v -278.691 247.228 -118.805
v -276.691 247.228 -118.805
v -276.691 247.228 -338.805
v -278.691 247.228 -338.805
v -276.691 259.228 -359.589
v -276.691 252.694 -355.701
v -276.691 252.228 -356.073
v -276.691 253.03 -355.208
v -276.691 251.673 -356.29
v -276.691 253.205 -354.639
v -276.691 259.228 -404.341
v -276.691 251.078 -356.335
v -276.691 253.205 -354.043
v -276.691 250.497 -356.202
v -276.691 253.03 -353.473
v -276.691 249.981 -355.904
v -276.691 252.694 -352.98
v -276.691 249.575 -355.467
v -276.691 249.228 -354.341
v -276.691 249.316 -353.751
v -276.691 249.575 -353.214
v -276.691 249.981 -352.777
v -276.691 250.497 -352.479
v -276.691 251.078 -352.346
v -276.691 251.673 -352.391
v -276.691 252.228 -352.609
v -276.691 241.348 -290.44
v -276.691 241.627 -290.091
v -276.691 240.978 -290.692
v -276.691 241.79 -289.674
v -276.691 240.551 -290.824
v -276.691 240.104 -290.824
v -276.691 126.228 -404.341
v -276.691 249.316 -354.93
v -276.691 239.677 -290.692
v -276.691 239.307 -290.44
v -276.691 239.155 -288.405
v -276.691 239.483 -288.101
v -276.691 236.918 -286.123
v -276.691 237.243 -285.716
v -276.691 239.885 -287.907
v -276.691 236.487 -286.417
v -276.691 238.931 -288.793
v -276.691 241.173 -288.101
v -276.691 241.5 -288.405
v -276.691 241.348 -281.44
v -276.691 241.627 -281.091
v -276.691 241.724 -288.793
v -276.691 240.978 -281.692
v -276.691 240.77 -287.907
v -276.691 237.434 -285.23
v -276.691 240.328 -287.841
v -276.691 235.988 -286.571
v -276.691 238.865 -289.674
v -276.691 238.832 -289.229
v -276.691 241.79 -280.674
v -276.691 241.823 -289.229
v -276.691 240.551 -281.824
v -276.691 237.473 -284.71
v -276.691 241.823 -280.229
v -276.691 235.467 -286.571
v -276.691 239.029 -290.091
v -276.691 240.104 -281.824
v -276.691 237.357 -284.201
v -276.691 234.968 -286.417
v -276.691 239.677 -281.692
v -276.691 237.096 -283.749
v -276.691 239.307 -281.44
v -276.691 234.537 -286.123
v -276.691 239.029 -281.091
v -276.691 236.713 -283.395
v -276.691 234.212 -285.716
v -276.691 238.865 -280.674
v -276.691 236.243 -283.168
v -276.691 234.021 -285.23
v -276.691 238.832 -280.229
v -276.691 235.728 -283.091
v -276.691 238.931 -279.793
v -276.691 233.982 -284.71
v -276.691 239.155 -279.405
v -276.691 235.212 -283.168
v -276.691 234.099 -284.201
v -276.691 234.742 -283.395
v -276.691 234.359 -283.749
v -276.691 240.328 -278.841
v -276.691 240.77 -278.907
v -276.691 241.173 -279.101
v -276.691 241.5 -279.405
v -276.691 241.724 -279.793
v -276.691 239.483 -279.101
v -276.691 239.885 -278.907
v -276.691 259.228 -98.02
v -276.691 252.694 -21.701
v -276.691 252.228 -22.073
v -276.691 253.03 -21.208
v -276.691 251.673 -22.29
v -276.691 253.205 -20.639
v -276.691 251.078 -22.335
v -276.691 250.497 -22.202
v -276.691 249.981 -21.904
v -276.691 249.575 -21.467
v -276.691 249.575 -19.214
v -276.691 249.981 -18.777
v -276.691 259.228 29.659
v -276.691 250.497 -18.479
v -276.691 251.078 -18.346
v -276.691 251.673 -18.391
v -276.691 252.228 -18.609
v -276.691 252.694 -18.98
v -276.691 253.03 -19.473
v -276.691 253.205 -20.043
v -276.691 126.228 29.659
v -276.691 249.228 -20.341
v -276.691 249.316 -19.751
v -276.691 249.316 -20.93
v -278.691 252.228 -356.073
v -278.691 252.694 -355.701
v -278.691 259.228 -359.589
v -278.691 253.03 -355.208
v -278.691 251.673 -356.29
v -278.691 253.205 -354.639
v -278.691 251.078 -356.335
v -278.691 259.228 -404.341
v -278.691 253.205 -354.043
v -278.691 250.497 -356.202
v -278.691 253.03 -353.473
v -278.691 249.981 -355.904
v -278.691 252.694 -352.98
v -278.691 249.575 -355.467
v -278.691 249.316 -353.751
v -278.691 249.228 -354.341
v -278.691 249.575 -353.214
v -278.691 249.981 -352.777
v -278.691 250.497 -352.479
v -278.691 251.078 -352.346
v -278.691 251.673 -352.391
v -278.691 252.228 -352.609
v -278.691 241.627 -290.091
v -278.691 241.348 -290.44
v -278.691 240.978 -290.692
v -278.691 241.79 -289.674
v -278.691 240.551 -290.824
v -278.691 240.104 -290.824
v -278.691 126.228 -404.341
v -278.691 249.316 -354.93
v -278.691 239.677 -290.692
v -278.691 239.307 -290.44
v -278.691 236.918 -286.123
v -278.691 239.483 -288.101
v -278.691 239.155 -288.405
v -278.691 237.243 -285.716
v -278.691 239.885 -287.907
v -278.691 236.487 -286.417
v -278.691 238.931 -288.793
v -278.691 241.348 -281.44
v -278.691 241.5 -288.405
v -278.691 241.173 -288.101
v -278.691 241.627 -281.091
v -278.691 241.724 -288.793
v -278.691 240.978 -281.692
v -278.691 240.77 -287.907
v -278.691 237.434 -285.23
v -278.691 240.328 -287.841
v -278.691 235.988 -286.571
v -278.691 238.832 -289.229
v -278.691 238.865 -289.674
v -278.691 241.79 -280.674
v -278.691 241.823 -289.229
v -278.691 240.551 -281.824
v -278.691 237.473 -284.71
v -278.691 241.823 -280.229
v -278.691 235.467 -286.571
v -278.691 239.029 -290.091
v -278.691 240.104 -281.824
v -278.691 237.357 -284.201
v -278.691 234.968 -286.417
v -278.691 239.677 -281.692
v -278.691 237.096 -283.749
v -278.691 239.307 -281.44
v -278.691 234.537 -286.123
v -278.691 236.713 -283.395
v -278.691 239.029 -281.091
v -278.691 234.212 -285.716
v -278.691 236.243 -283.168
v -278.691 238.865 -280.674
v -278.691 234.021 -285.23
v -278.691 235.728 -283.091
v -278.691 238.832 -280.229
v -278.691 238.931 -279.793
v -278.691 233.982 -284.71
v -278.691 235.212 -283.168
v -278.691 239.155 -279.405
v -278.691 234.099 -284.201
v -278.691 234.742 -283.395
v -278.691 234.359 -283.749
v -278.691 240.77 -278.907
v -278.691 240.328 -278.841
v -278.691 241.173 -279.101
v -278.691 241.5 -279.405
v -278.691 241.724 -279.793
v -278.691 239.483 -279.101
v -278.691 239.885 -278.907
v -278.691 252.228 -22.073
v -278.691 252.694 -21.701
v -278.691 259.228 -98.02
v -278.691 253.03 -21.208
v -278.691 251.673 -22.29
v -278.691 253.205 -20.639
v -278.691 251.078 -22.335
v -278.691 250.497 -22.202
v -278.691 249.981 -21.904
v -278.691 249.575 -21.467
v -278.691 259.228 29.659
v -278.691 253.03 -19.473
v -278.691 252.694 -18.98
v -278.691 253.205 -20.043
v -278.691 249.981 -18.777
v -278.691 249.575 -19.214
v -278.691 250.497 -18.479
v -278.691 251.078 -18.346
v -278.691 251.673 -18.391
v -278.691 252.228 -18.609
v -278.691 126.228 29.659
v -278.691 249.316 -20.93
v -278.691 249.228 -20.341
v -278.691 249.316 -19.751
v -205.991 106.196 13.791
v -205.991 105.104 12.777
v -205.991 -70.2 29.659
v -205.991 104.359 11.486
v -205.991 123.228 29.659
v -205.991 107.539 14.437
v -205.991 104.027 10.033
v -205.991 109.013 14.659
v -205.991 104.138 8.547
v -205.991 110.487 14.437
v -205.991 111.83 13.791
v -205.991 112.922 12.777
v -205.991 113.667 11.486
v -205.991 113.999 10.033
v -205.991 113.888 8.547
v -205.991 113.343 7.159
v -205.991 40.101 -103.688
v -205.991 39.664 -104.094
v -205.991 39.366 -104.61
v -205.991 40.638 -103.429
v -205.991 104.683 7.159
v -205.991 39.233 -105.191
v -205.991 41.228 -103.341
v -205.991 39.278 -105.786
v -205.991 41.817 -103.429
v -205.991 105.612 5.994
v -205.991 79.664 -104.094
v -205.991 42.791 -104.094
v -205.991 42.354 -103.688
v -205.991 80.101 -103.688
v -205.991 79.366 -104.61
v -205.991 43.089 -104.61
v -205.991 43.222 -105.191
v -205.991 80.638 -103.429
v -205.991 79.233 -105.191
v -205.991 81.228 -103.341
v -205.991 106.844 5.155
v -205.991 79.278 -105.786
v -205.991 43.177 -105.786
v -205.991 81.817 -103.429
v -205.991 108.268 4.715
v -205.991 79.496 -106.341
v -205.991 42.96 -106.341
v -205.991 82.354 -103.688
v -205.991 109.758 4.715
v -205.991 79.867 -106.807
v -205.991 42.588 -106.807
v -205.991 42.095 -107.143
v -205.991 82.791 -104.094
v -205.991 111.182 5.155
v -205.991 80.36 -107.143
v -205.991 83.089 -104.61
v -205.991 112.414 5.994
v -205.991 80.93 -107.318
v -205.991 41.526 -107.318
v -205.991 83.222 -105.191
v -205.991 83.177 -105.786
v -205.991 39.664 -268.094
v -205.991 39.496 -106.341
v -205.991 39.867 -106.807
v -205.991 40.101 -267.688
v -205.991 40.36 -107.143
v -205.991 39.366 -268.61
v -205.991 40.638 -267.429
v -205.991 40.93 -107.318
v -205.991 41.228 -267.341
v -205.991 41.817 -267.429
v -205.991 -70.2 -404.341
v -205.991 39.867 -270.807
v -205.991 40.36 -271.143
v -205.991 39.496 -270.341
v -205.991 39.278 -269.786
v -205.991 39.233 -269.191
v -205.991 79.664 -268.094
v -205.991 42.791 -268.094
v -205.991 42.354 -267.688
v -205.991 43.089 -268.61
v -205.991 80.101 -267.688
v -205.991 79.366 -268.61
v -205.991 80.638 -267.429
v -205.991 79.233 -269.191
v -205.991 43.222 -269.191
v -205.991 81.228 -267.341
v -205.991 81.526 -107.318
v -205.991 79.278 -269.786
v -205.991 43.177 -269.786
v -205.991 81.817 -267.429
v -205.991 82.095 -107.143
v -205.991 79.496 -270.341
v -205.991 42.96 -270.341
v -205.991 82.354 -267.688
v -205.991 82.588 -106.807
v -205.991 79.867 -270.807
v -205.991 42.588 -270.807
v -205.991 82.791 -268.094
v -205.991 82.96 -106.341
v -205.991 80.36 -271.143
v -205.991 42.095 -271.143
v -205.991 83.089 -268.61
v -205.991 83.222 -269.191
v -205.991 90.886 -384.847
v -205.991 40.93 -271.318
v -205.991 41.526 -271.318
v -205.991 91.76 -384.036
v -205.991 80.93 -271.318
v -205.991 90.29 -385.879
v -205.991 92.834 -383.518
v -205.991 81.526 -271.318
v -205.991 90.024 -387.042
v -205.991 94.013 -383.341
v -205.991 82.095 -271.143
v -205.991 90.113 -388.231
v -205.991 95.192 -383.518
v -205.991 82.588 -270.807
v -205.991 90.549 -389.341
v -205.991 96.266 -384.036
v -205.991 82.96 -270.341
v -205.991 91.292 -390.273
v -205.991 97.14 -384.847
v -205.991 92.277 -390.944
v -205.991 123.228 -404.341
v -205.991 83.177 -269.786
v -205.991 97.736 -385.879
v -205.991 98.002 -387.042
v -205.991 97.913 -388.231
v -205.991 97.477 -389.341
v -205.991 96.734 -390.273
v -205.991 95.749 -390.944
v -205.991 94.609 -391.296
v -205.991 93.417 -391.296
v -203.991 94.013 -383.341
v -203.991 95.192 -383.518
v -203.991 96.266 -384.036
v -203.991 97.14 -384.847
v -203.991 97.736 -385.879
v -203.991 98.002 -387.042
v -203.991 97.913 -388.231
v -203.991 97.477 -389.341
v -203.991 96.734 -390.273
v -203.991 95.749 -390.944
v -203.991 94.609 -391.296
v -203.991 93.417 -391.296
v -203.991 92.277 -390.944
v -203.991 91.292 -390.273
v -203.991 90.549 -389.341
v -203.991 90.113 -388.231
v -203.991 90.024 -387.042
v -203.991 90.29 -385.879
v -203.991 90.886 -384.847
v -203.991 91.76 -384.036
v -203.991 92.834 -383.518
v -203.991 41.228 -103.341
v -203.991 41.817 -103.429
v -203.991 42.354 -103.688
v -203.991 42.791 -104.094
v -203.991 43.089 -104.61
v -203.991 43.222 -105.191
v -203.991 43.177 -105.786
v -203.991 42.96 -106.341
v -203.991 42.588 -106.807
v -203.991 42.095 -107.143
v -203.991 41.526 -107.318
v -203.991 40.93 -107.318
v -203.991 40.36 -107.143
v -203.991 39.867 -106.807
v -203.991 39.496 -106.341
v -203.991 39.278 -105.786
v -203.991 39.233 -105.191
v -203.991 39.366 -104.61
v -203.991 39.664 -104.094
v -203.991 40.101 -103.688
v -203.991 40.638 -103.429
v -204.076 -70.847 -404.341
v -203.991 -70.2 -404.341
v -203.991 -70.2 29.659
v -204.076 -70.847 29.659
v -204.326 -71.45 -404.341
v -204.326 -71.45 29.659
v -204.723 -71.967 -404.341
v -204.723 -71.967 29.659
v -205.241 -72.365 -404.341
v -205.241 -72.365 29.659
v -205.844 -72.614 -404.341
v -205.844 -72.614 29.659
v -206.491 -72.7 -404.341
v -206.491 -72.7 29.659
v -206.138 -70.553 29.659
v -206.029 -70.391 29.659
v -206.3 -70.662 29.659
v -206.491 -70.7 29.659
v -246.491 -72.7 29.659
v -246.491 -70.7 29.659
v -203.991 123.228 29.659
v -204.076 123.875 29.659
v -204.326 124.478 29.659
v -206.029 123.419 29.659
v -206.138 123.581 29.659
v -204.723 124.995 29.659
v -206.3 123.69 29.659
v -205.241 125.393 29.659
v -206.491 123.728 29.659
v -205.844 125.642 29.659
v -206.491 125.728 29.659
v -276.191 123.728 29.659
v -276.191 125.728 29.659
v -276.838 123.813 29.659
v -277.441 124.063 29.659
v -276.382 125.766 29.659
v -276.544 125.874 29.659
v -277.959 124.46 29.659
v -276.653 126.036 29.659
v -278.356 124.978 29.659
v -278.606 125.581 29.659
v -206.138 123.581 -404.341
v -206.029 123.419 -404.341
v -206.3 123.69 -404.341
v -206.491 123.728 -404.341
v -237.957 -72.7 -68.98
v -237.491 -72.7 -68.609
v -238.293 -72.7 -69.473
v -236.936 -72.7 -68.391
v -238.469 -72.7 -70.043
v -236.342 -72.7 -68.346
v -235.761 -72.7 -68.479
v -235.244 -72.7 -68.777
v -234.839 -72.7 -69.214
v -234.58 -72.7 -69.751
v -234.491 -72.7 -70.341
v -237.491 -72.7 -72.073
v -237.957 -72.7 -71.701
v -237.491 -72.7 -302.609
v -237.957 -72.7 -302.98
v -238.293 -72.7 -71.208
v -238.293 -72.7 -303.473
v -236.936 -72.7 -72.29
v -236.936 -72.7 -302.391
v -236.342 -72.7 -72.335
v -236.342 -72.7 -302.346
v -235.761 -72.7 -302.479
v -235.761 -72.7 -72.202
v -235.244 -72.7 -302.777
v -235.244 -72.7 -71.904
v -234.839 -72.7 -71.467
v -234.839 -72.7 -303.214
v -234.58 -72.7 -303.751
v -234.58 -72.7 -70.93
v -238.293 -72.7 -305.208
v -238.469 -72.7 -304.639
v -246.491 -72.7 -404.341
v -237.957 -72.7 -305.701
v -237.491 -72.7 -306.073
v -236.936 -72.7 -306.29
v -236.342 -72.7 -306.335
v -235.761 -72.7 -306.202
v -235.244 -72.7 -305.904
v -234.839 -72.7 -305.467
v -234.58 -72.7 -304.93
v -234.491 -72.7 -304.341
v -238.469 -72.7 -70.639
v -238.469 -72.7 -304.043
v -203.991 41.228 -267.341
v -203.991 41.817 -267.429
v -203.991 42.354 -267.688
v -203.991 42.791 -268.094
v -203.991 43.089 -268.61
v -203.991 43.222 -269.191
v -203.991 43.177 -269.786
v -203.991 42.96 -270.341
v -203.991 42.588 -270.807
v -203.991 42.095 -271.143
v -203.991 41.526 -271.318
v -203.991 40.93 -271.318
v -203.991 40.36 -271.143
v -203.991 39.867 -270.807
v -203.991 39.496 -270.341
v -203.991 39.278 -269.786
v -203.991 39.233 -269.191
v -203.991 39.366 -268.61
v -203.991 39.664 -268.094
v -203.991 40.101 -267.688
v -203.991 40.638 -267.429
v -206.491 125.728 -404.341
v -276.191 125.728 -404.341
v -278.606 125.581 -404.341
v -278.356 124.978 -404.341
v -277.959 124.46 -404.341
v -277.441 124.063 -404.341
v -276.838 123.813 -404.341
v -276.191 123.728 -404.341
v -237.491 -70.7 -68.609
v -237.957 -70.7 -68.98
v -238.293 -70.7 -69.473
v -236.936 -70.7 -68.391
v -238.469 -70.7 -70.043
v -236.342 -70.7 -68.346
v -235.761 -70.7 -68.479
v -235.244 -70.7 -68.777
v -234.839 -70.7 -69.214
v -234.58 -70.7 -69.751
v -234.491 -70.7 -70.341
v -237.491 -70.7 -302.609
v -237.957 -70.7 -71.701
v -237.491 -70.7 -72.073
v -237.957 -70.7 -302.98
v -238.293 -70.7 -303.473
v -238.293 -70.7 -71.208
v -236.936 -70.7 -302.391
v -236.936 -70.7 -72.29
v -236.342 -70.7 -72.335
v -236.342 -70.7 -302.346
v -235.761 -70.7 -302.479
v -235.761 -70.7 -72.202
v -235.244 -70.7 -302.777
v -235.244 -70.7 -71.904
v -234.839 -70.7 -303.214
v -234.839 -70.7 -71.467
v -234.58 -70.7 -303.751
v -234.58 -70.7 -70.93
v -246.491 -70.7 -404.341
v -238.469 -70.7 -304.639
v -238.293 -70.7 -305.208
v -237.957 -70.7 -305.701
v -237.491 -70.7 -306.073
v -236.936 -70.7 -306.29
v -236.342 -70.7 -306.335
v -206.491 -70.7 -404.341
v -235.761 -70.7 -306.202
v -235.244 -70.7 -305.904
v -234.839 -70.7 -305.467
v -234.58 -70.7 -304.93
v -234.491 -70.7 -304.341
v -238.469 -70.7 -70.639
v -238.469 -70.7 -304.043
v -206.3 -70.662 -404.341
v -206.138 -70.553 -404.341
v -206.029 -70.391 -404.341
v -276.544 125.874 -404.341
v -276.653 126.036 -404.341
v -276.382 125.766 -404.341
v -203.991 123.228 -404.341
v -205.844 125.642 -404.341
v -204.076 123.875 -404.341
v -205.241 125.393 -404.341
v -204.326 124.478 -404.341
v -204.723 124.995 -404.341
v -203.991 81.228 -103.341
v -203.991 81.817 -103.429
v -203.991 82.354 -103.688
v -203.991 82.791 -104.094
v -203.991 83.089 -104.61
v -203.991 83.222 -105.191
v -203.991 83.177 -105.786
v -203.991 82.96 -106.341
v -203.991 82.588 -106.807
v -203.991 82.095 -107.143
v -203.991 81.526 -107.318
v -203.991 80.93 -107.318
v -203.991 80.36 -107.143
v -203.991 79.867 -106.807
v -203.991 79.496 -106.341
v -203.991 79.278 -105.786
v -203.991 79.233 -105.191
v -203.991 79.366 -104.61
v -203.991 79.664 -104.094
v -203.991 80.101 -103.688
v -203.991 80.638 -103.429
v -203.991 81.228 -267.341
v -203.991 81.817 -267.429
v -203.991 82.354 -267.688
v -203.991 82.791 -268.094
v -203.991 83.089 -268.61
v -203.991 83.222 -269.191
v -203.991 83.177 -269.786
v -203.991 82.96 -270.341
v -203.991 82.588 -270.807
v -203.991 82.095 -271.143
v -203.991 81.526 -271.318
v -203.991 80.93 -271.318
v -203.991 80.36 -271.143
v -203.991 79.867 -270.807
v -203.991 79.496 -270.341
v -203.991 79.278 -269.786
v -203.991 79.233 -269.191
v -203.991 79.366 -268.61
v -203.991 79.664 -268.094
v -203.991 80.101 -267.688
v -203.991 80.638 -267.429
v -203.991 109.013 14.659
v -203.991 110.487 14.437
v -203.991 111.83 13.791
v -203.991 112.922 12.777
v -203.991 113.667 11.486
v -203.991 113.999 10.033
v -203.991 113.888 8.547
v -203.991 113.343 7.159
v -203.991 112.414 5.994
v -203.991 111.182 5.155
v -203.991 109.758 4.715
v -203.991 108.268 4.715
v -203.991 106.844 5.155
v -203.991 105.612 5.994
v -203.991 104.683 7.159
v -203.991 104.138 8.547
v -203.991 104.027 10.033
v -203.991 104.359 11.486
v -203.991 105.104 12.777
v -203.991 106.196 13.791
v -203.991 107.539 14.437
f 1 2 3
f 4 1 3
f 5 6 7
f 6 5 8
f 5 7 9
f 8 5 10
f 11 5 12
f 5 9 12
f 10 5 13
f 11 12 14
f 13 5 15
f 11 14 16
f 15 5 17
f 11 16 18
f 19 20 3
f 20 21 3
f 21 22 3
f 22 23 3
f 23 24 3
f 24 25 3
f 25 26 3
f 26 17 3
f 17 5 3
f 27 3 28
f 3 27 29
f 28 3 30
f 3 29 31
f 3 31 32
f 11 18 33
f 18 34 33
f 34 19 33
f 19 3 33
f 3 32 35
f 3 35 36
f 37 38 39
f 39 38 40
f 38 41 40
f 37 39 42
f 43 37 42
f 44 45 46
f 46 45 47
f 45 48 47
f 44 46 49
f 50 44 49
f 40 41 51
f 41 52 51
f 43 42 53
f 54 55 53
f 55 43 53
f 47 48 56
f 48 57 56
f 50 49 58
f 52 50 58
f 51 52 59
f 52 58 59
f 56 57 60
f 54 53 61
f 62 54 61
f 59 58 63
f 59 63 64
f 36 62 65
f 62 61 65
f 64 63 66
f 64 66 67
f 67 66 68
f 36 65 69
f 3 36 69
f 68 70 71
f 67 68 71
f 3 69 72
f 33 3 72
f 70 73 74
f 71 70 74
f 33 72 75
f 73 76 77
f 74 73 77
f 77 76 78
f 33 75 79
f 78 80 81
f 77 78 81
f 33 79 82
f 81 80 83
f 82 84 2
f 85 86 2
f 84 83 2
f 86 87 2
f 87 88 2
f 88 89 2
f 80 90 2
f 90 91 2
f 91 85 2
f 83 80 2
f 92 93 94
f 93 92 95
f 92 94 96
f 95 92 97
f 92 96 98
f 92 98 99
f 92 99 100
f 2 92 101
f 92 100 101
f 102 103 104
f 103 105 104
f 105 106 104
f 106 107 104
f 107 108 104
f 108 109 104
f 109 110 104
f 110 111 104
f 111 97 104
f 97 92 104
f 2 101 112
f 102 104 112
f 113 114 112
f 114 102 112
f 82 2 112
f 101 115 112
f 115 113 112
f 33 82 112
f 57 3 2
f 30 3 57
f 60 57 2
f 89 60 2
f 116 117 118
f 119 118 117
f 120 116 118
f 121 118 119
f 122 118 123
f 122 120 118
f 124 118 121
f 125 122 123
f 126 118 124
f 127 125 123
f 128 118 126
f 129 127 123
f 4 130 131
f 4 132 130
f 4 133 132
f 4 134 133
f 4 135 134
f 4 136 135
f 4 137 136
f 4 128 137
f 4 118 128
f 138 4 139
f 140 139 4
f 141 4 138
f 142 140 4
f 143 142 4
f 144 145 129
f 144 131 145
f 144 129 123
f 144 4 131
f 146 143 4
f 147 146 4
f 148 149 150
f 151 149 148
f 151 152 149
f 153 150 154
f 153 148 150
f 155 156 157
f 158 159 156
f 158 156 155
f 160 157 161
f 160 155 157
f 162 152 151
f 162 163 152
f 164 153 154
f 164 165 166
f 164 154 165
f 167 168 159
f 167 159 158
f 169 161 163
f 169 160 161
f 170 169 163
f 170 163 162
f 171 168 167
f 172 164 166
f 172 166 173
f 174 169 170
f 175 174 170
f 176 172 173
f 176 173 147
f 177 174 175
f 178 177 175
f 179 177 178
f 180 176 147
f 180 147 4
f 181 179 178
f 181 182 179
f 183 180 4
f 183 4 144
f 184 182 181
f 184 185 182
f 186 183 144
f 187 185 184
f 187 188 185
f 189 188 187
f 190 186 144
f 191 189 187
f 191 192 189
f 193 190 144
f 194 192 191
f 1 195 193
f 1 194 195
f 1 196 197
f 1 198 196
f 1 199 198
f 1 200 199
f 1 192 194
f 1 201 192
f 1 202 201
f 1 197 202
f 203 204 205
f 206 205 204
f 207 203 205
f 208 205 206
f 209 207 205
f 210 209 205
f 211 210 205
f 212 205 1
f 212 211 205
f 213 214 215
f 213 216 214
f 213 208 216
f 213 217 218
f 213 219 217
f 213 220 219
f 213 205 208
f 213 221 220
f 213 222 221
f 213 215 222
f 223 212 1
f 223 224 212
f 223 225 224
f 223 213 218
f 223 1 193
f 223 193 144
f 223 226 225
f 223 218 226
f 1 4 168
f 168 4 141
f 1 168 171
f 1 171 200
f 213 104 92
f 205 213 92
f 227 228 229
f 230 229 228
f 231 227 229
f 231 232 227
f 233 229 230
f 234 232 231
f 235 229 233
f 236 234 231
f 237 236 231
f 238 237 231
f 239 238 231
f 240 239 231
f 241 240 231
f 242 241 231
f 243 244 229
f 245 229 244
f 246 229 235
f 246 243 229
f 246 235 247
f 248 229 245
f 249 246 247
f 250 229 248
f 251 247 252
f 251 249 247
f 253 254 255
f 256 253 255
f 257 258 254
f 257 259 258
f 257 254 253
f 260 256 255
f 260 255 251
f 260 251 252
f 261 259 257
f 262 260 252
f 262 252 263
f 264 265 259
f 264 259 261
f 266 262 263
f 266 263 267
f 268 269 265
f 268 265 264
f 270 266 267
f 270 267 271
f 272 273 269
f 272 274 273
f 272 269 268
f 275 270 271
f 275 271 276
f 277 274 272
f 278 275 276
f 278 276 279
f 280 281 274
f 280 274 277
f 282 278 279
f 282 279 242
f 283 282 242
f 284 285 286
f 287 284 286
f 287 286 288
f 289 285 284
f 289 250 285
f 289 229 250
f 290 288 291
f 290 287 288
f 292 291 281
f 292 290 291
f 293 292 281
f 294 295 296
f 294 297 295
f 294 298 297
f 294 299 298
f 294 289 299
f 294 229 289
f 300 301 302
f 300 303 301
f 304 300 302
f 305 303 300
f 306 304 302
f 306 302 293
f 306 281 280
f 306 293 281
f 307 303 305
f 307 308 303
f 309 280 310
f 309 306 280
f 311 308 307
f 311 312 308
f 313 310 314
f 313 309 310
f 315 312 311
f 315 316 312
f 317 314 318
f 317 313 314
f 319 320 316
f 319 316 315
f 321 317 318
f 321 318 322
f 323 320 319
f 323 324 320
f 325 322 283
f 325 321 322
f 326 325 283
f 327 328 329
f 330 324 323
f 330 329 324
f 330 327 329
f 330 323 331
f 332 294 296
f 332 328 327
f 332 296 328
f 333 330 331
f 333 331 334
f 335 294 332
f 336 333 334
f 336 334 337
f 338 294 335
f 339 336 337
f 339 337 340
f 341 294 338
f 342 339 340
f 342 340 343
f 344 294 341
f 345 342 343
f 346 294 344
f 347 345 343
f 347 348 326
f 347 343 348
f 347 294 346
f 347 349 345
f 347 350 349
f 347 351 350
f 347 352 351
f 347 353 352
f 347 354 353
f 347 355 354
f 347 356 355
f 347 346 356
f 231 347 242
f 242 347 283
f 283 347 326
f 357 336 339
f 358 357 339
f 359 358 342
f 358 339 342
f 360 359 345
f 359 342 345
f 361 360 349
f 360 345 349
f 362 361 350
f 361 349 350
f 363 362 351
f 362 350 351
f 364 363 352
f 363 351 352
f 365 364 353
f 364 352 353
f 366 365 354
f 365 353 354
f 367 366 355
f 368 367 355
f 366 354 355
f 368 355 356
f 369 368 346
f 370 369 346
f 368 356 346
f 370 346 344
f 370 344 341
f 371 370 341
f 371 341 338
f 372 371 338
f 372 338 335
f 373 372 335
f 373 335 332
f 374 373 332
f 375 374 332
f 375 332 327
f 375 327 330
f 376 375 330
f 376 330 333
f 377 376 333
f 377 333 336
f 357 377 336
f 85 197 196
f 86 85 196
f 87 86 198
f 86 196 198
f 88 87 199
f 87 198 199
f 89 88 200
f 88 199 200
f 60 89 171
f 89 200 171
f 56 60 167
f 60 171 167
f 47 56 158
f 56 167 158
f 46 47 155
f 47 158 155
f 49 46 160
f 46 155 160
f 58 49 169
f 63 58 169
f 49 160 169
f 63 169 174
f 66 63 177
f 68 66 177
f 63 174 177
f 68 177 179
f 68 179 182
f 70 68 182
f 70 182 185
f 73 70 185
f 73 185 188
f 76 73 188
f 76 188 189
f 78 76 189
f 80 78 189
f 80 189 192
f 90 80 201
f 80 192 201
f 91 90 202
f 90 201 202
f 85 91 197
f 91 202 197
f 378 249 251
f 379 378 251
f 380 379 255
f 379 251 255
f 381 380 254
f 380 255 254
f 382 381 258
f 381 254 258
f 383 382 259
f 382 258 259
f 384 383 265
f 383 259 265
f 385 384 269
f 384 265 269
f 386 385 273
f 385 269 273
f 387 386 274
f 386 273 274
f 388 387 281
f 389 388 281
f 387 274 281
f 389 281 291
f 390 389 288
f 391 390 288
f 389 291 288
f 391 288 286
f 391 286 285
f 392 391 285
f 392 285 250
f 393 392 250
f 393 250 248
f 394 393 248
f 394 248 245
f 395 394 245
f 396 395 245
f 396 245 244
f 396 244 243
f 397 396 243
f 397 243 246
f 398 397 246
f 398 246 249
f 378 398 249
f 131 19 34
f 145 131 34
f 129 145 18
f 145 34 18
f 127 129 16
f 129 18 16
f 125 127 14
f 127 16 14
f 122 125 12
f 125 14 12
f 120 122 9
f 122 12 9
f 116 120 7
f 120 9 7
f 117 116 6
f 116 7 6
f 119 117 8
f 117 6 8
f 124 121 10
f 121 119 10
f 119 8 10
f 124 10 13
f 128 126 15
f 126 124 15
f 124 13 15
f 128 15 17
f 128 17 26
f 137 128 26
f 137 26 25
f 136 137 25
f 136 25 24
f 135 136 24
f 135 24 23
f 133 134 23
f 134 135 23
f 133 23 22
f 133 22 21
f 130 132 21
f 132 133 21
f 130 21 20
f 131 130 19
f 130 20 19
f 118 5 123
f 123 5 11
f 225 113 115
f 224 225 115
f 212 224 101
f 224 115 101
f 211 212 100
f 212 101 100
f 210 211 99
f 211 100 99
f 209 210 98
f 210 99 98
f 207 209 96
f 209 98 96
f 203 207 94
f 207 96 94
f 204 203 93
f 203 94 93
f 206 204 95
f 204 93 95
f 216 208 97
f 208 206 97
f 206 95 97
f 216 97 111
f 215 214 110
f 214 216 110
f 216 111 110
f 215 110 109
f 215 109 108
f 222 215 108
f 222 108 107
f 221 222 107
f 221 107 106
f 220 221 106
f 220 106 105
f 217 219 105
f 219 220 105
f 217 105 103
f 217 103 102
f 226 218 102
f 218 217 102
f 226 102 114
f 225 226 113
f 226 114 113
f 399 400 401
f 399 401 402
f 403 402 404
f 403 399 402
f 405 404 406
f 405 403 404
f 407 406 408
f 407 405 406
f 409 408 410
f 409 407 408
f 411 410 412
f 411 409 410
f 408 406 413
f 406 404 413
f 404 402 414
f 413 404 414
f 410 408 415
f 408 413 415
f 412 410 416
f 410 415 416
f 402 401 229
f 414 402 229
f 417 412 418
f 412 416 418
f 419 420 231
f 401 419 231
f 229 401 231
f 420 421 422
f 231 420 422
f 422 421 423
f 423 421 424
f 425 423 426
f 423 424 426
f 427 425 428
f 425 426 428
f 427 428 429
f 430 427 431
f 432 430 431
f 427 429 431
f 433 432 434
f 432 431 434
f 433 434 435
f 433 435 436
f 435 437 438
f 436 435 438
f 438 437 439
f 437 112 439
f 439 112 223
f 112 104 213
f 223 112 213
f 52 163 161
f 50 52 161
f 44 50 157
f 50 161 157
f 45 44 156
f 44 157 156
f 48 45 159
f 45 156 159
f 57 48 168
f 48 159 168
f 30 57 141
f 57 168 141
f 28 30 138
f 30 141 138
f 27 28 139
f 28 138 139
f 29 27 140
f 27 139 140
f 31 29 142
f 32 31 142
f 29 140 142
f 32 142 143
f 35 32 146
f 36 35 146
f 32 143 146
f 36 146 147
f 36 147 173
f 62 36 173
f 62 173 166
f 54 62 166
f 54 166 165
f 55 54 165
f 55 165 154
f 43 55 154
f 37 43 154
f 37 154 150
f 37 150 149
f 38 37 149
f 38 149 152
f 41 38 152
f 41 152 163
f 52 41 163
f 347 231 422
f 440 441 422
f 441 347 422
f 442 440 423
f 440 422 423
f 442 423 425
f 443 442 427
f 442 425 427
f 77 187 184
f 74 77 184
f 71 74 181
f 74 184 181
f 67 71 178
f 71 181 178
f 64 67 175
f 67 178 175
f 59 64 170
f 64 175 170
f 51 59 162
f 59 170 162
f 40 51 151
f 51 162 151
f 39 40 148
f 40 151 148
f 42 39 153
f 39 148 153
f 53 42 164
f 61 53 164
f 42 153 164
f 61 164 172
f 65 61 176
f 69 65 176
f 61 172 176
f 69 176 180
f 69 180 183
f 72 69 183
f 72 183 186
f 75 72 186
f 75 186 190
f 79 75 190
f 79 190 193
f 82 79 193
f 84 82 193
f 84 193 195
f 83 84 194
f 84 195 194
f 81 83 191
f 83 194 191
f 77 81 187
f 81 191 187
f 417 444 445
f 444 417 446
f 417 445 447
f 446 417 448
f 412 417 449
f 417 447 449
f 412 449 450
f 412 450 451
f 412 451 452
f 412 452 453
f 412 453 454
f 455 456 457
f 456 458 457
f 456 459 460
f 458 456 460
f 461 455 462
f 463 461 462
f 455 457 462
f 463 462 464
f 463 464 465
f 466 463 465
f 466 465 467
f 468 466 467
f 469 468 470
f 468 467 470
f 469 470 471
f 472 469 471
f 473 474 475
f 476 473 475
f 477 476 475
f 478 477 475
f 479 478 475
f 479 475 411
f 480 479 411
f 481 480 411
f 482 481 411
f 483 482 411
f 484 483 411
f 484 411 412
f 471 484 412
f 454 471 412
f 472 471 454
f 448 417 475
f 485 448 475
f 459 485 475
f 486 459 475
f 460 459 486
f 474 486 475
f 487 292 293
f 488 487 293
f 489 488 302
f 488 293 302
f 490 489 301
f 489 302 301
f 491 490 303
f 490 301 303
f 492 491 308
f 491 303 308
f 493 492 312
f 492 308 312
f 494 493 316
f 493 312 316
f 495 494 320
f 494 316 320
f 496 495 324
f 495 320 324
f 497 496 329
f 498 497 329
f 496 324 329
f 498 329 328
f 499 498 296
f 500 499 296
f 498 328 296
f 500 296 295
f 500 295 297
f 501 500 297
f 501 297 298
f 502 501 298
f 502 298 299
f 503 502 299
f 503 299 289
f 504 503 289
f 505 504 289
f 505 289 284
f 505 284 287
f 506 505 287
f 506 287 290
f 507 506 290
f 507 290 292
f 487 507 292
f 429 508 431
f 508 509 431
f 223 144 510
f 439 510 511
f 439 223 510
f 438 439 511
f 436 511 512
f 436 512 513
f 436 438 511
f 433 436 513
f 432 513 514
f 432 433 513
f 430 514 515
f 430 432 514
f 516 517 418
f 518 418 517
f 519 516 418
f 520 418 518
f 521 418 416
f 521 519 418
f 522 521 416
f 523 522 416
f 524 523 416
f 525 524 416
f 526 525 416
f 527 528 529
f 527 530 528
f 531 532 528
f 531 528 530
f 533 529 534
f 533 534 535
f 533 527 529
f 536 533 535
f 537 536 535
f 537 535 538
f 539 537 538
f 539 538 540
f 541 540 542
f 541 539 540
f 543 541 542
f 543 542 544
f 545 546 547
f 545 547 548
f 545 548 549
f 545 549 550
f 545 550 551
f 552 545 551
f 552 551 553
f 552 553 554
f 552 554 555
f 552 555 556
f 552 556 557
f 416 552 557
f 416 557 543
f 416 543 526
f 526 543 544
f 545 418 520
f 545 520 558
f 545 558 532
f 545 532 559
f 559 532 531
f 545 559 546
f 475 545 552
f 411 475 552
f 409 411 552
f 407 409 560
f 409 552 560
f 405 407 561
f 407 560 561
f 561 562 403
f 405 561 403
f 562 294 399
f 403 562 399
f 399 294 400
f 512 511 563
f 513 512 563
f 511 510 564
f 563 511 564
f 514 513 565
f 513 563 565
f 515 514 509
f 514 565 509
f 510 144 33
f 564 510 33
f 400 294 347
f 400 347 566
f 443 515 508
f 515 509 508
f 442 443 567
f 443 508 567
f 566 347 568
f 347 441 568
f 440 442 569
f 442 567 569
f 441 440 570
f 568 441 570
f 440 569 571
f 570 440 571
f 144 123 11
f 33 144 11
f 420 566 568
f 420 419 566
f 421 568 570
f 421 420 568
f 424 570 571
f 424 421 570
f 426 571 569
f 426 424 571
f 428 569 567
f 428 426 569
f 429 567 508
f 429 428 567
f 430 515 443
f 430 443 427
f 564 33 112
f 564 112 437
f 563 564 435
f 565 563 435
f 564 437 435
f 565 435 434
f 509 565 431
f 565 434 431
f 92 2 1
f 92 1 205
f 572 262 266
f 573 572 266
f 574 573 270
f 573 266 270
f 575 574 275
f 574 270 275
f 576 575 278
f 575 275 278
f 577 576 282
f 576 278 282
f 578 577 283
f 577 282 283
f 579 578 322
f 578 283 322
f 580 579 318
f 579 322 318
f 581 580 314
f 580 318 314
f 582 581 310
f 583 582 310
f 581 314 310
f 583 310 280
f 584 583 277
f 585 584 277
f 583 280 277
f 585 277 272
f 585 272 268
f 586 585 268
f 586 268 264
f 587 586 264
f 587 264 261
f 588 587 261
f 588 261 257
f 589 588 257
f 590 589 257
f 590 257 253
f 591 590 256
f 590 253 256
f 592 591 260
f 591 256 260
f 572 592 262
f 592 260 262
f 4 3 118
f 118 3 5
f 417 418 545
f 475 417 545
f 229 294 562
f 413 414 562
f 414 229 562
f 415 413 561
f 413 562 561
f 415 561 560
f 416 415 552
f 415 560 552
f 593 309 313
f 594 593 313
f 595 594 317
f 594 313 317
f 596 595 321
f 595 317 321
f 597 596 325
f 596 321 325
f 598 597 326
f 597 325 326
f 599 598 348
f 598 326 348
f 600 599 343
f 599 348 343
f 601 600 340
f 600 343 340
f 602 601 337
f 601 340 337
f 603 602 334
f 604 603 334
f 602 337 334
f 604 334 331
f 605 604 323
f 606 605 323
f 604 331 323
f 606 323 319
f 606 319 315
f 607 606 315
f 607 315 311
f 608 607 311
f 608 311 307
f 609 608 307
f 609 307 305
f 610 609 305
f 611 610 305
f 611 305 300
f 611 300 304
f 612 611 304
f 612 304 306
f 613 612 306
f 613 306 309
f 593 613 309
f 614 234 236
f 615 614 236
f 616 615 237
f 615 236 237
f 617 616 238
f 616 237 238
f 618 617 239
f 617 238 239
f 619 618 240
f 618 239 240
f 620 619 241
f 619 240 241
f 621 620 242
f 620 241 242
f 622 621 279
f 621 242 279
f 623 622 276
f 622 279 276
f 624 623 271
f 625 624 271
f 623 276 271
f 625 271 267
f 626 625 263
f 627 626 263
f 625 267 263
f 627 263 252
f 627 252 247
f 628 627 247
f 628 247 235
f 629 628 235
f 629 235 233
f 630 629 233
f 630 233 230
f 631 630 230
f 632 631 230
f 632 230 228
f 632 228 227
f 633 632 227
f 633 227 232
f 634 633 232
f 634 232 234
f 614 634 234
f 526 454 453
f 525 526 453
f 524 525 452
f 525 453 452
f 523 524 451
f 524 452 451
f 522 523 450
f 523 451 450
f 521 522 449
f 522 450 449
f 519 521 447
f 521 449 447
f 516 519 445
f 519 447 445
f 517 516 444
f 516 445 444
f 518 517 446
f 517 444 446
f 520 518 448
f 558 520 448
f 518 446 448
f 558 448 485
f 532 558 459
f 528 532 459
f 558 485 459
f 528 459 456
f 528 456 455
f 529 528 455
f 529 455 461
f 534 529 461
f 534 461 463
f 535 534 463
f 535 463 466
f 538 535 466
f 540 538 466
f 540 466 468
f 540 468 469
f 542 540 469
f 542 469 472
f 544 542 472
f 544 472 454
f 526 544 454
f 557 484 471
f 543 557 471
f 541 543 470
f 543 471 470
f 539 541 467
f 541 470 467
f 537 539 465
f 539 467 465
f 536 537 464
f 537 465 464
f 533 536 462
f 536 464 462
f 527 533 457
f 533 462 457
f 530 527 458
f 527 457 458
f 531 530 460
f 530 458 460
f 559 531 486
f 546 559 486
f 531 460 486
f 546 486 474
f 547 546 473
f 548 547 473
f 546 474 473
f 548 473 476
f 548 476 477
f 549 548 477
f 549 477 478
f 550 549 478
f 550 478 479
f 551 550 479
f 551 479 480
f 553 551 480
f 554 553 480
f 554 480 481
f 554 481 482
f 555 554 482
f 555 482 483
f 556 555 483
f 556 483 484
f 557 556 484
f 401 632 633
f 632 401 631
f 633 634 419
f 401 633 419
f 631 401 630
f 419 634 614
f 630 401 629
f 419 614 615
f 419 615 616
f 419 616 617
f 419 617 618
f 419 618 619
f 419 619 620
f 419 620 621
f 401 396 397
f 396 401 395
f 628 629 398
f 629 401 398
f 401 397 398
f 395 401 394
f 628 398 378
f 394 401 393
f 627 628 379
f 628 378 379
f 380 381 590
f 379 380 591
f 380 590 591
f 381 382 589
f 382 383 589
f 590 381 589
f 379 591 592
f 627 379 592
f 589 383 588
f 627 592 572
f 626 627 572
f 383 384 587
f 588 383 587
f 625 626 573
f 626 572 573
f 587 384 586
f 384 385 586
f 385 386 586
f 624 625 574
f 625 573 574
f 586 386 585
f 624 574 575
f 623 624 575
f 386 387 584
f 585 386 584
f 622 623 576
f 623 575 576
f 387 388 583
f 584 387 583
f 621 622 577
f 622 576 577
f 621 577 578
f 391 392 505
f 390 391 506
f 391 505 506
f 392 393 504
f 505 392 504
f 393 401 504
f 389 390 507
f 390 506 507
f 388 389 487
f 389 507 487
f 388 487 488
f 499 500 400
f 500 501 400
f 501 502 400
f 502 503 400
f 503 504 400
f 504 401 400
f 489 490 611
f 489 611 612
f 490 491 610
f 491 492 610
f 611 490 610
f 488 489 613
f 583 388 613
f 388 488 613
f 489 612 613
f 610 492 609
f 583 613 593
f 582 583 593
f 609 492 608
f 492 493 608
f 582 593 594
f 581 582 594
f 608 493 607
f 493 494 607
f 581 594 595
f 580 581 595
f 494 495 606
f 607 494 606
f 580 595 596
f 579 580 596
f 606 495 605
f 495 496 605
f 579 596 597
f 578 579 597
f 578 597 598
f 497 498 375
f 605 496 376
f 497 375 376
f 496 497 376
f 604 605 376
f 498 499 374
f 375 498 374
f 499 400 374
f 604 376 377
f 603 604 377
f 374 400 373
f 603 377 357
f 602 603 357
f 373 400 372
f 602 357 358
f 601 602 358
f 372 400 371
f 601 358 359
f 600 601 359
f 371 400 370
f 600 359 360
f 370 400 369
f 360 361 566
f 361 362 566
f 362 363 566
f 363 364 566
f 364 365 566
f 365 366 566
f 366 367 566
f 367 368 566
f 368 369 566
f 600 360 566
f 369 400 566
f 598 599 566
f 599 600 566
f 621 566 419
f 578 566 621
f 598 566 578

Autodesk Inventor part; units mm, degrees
ref_plane "YZ Plane" through (0, 0, 0) normal (1, 0, 0) x (0, 1, 0)
ref_plane "XZ Plane" through (0, 0, 0) normal (0, 1, 0) x (-1, 0, 0)
ref_plane "XY Plane" through (0, 0, 0) normal (0, 0, 1) x (1, 0, 0)
sketch "Boceto10" plane through (0, 0, 0) normal (0, 1, 0) x (-1, 0, 0)
  line L0 (9.2786, 29.6594) -> (9.2786, -404.3406)
  line L1 (9.2786, -404.3406) -> (-105.7214, -404.3406)
  line L2 (-105.7214, -404.3406) -> (-105.7214, 29.6594)
  line L3 (-105.7214, 29.6594) -> (9.2786, 29.6594)
  line L4 (-105.7214, 29.6594) -> (-123.7214, 29.6594)
  line L5 (-123.7214, -404.3406) -> (-105.7214, -404.3406)
  line L6 (9.2786, 29.6594) -> (79.7636, 29.6594)
  line L7 (79.7636, 29.6594) -> (79.7636, -404.3406)
  line L8 (79.7636, -404.3406) -> (9.2786, -404.3406)
  line L9 (-123.7214, 29.6594) -> (-123.7214, -98.0201)
  line L10 (-111.7214, -118.8047) -> (-111.7214, -338.8047)
  line L11 (-123.7214, 29.6594) -> (-123.7214, -98.0201)
  line L12 (-123.7214, -359.5893) -> (-123.7214, -404.3406)
  circle A0 centre (-115.7214, -20.3406) radius 2
  circle A1 centre (-115.7214, -354.3406) radius 2
  line L13 (-111.7214, -118.8047) -> (-123.7214, -98.0201)
  line L14 (-111.7214, -338.8047) -> (-123.7214, -359.5893)
  point P0 (0, 0)
  dimension "d65" = 434
  dimension "d66" = 115
  dimension "d67" = 18
  dimension "d76" = 70.485
  dimension "d77" = 434
  dimension "d108" = 220
  dimension "d125" = 4
  dimension "d126" = 8
  dimension "d127" = 50
  dimension "d128" = 4
  dimension "d129" = 8
  dimension "d130" = 50
  dimension "d133" = 18
  dimension "d166" = 12
extrude "Extrusión13" add sketch "Boceto10" along normal blind 2 contours L0 L1 L2 L3
extrude "Extrusión14" add sketch "Boceto10" along normal blind 2 contours L2 L5 L12 L14 L10 L13 L9 L4
extrude "Extrusión15" add sketch "Boceto10" along normal blind 2 contours L6 L7 L8 L0
bend part "Pieza de plegado2" radius 0.5 angle 90 line through (-9.2786, 0, 29.6594) along (0, 0, -1) centre toward (0, -1, 0) moving side (-1, 0, 0) both sides no
sketch "Boceto11" plane through (-11.7786, -70.1996, -404.3406) normal (-1, 0, 0) x (0, 0, 1)
  line L0 (0, 0) -> (434, 0) projected
  line L1 (434, 0) -> (434, -194.998)
  line L2 (434, -194.998) -> (0, -194.998)
  line L3 (0, -194.998) -> (0, 0)
  circle A0 centre (17, -30) radius 4
  circle A1 centre (414, -15) radius 5
  point P0 (404.3406, 70.1996)
  dimension "d82" = 194.998
  dimension "d158" = 8
  dimension "d159" = 10
  dimension "d161" = 17
  dimension "d162" = 20
  dimension "d164" = 15
  dimension "d165" = 30
extrude "Extrusión16" add sketch "Boceto11" against normal blind 2
bend part "Pieza de plegado3" radius 0.5 angle 90 line through (-11.7786, -70.1996, -404.3406) along (0, 0, 1) centre toward (-1, 0, 0) moving side (0, -1, 0) both sides no
sketch "Boceto14" plane through (-206.4912, -70.6996, -404.3406) normal (0, 1, 0) x (1, 0, 0)
  line L0 (0, 0) -> (0, -434) projected
  line L1 (0, -434) -> (-40, -434)
  line L2 (-40, -434) -> (-40, 0)
  line L3 (-40, 0) -> (0, 0)
  line L4 (0, -434) -> (194.2126, -434) projected
  line L5 (194.2126, 0) -> (0, 0) projected
  line L6 (0, -434) -> (0, 0)
  point P0 (206.4912, -404.3406)
  dimension "d91" = 40
  dimension "d92" = 434
extrude "Extrusión17" add sketch "Boceto14" against normal blind 2
bend part "Pieza de plegado4" radius 0.5 angle 90 line through (-206.4912, -70.6996, -404.3406) along (0, 0, 1) centre toward (0, 1, 0) moving side (1, 0, 0) both sides no
sketch "Boceto15" plane through (-246.4912, -72.6996, 29.6594) normal (0, -1, 0) x (1, 0, 0)
  line L0 (0, -434) -> (0, 0) projected
  line L1 (0, -434) -> (8.8, -434)
  line L2 (-29.6996, -434) -> (40, -434) projected
  circle A0 centre (10, -334) radius 2
  circle A1 centre (10, -100) radius 2
  point P0 (246.4912, -29.6594)
  dimension "d97" = 8.8
  dimension "d98" = 4
  dimension "d99" = 4
  dimension "d101" = 234
  dimension "d102" = 10
  dimension "d103" = 10
  dimension "d136" = 100
extrude "Extrusión18" cut sketch "Boceto15" against normal blind 10
sketch "Boceto16" plane through (-205.9912, -70.1996, 29.6594) normal (-1, 0, 0) x (0, 0, 1)
  circle A0 centre (-135, 111.4272) radius 2
  circle A1 centre (-299, 111.4272) radius 2
  line L0 (0, 193.4272) -> (-434, 193.4272) projected
  line L1 (0, 0) -> (0, 193.4272) projected
  line L2 (-434, 193.4272) -> (-434, 0) projected
  circle A2 centre (-135, 151.4272) radius 2
  circle A3 centre (-299, 151.4272) radius 2
  dimension "d109" = 4
  dimension "d111" = 4
  dimension "d113" = 82
  dimension "d114" = 135
  dimension "d116" = 82
  dimension "d117" = 135
  dimension "d137" = 4
  dimension "d138" = 40
  dimension "d139" = 4
  dimension "d140" = 40
extrude "Extrusión19" cut sketch "Boceto16" against normal blind 10
sketch "Boceto17" plane through (-278.6908, 126.2276, 29.6594) normal (-1, 0, 0) x (0, 0, 1)
  line L0 (0, 0) -> (0, 133) projected
  line L1 (0, 133) -> (-127.6795, 133) projected
  circle A0 centre (-319, 114.1) radius 1.5
  circle A1 centre (-310, 114.1) radius 1.5
  line L2 (-434, 133) -> (-434, 0) projected
  line L3 (-389.2487, 133) -> (-434, 133) projected
  circle A2 centre (-314.5, 109.5) radius 1.75
  point P0 (-29.6594, -126.2276)
  dimension "d148" = 3
  dimension "d149" = 3
  dimension "d150" = 115
  dimension "d151" = 18.9
  dimension "d152" = 9
  dimension "d153" = 18.9
  dimension "d154" = 3.5
  dimension "d156" = 4.6
  dimension "d157" = 4.5
extrude "Extrusión20" cut sketch "Boceto17" against normal blind 10
equation "\"d67\" = d133"
equation "\"d126\" = d129"
equation "\"d102\" = d103"
equation "\"d116\" = d113"
equation "\"d153\" = d151"
properties part number "Chapon" material "Aluminum 1100-H14"
